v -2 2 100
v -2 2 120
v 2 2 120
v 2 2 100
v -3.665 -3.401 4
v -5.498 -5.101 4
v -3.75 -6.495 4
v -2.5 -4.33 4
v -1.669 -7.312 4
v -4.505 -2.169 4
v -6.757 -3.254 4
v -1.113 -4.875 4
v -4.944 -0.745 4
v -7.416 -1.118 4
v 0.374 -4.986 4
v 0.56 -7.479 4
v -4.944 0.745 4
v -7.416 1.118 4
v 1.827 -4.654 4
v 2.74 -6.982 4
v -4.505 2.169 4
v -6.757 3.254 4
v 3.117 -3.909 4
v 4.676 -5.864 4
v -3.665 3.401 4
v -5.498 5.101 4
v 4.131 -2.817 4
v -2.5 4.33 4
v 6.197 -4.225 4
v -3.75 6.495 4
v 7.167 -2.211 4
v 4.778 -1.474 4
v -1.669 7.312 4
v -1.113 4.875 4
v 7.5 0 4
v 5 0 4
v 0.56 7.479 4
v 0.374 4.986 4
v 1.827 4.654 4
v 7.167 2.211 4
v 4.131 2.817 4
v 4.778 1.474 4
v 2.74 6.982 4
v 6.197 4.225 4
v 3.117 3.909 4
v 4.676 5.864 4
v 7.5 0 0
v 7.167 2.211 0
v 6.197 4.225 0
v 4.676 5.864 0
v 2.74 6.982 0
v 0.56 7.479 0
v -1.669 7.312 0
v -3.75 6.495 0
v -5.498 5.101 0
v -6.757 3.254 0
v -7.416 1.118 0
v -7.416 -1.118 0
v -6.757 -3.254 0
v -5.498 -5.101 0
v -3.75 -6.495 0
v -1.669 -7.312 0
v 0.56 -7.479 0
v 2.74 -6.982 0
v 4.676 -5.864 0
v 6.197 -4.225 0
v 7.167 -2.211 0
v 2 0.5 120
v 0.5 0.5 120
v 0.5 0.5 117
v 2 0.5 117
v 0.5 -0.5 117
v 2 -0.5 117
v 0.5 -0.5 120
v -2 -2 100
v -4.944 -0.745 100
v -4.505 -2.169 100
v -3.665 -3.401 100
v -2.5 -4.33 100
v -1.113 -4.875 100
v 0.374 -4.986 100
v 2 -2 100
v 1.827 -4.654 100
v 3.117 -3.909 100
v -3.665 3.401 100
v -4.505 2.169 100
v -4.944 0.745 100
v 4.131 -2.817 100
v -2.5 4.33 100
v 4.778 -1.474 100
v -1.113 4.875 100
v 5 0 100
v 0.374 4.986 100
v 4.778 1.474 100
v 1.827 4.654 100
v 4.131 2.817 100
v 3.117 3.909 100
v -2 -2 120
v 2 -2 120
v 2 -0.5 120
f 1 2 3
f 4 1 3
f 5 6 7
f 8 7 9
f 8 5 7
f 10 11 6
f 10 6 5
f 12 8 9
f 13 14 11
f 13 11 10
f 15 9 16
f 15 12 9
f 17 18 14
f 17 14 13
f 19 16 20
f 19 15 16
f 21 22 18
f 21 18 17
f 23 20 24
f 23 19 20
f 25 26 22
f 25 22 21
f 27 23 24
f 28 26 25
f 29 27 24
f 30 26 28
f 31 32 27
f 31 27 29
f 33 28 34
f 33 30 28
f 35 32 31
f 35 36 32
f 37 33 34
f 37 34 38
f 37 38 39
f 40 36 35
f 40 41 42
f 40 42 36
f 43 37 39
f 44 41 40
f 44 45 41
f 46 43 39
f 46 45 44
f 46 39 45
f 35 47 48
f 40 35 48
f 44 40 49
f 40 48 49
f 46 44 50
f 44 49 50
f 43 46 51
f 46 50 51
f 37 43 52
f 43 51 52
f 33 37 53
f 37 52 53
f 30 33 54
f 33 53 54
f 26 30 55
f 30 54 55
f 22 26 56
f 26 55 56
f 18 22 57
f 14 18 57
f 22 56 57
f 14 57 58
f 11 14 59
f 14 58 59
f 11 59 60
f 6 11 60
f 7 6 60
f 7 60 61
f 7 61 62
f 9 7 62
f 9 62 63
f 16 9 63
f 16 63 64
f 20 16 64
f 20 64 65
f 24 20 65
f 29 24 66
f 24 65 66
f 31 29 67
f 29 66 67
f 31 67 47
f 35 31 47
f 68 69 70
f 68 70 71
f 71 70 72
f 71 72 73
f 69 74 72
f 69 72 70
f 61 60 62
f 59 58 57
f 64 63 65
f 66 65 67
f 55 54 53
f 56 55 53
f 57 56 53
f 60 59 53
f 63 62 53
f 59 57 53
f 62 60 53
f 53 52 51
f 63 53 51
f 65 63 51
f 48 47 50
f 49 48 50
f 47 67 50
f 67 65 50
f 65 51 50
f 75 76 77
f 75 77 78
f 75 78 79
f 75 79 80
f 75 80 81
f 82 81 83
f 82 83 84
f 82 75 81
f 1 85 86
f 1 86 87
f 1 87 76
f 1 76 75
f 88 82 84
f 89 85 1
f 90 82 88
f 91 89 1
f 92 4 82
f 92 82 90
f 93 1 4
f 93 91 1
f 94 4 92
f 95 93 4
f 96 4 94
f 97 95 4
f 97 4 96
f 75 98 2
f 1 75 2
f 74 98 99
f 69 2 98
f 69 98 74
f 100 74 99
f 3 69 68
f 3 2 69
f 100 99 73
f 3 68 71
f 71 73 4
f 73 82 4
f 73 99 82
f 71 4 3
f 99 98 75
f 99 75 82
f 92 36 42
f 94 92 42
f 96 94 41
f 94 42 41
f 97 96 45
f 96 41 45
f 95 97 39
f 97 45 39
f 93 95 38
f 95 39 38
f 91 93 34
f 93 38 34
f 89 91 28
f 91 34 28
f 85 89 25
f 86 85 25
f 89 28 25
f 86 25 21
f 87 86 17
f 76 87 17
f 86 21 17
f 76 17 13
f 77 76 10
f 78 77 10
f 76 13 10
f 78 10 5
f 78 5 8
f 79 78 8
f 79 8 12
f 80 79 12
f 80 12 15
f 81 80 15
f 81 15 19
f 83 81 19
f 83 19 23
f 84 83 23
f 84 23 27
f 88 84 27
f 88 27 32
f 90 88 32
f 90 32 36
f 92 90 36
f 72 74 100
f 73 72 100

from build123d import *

# Parameters (mm, degrees)
F0_R     = 7.5
F1_DEPTH = 4
F2_R     = 5
F3_DEPTH = 100
F4_W     = 4
F4_H     = 4
F5_DEPTH = 20
F6_W     = 2.261252
F6_H     = 1
F7_DEPTH = 3


with BuildPart() as f1:
    # F0 (on Top) → F1 (new body)
    with BuildSketch(Plane.XY):
        Circle(F0_R)
    extrude(amount=F1_DEPTH)

    # F2 (on Top) → F3 (join)
    with BuildSketch(Plane.XY):
        Circle(F2_R)
    extrude(amount=F3_DEPTH)

    # F4 (on face) → F5 (join)
    with BuildSketch(Plane.XY.offset(100)):
        Rectangle(F4_W, F4_H)
    extrude(amount=F5_DEPTH)

    # F6 (on face) → F7 (cut)
    with BuildSketch(Plane.XY.offset(120)):
        with Locations((1.630626, 0)):
            Rectangle(F6_W, F6_H)
    extrude(amount=-F7_DEPTH, mode=Mode.SUBTRACT)


solid = f1.part
